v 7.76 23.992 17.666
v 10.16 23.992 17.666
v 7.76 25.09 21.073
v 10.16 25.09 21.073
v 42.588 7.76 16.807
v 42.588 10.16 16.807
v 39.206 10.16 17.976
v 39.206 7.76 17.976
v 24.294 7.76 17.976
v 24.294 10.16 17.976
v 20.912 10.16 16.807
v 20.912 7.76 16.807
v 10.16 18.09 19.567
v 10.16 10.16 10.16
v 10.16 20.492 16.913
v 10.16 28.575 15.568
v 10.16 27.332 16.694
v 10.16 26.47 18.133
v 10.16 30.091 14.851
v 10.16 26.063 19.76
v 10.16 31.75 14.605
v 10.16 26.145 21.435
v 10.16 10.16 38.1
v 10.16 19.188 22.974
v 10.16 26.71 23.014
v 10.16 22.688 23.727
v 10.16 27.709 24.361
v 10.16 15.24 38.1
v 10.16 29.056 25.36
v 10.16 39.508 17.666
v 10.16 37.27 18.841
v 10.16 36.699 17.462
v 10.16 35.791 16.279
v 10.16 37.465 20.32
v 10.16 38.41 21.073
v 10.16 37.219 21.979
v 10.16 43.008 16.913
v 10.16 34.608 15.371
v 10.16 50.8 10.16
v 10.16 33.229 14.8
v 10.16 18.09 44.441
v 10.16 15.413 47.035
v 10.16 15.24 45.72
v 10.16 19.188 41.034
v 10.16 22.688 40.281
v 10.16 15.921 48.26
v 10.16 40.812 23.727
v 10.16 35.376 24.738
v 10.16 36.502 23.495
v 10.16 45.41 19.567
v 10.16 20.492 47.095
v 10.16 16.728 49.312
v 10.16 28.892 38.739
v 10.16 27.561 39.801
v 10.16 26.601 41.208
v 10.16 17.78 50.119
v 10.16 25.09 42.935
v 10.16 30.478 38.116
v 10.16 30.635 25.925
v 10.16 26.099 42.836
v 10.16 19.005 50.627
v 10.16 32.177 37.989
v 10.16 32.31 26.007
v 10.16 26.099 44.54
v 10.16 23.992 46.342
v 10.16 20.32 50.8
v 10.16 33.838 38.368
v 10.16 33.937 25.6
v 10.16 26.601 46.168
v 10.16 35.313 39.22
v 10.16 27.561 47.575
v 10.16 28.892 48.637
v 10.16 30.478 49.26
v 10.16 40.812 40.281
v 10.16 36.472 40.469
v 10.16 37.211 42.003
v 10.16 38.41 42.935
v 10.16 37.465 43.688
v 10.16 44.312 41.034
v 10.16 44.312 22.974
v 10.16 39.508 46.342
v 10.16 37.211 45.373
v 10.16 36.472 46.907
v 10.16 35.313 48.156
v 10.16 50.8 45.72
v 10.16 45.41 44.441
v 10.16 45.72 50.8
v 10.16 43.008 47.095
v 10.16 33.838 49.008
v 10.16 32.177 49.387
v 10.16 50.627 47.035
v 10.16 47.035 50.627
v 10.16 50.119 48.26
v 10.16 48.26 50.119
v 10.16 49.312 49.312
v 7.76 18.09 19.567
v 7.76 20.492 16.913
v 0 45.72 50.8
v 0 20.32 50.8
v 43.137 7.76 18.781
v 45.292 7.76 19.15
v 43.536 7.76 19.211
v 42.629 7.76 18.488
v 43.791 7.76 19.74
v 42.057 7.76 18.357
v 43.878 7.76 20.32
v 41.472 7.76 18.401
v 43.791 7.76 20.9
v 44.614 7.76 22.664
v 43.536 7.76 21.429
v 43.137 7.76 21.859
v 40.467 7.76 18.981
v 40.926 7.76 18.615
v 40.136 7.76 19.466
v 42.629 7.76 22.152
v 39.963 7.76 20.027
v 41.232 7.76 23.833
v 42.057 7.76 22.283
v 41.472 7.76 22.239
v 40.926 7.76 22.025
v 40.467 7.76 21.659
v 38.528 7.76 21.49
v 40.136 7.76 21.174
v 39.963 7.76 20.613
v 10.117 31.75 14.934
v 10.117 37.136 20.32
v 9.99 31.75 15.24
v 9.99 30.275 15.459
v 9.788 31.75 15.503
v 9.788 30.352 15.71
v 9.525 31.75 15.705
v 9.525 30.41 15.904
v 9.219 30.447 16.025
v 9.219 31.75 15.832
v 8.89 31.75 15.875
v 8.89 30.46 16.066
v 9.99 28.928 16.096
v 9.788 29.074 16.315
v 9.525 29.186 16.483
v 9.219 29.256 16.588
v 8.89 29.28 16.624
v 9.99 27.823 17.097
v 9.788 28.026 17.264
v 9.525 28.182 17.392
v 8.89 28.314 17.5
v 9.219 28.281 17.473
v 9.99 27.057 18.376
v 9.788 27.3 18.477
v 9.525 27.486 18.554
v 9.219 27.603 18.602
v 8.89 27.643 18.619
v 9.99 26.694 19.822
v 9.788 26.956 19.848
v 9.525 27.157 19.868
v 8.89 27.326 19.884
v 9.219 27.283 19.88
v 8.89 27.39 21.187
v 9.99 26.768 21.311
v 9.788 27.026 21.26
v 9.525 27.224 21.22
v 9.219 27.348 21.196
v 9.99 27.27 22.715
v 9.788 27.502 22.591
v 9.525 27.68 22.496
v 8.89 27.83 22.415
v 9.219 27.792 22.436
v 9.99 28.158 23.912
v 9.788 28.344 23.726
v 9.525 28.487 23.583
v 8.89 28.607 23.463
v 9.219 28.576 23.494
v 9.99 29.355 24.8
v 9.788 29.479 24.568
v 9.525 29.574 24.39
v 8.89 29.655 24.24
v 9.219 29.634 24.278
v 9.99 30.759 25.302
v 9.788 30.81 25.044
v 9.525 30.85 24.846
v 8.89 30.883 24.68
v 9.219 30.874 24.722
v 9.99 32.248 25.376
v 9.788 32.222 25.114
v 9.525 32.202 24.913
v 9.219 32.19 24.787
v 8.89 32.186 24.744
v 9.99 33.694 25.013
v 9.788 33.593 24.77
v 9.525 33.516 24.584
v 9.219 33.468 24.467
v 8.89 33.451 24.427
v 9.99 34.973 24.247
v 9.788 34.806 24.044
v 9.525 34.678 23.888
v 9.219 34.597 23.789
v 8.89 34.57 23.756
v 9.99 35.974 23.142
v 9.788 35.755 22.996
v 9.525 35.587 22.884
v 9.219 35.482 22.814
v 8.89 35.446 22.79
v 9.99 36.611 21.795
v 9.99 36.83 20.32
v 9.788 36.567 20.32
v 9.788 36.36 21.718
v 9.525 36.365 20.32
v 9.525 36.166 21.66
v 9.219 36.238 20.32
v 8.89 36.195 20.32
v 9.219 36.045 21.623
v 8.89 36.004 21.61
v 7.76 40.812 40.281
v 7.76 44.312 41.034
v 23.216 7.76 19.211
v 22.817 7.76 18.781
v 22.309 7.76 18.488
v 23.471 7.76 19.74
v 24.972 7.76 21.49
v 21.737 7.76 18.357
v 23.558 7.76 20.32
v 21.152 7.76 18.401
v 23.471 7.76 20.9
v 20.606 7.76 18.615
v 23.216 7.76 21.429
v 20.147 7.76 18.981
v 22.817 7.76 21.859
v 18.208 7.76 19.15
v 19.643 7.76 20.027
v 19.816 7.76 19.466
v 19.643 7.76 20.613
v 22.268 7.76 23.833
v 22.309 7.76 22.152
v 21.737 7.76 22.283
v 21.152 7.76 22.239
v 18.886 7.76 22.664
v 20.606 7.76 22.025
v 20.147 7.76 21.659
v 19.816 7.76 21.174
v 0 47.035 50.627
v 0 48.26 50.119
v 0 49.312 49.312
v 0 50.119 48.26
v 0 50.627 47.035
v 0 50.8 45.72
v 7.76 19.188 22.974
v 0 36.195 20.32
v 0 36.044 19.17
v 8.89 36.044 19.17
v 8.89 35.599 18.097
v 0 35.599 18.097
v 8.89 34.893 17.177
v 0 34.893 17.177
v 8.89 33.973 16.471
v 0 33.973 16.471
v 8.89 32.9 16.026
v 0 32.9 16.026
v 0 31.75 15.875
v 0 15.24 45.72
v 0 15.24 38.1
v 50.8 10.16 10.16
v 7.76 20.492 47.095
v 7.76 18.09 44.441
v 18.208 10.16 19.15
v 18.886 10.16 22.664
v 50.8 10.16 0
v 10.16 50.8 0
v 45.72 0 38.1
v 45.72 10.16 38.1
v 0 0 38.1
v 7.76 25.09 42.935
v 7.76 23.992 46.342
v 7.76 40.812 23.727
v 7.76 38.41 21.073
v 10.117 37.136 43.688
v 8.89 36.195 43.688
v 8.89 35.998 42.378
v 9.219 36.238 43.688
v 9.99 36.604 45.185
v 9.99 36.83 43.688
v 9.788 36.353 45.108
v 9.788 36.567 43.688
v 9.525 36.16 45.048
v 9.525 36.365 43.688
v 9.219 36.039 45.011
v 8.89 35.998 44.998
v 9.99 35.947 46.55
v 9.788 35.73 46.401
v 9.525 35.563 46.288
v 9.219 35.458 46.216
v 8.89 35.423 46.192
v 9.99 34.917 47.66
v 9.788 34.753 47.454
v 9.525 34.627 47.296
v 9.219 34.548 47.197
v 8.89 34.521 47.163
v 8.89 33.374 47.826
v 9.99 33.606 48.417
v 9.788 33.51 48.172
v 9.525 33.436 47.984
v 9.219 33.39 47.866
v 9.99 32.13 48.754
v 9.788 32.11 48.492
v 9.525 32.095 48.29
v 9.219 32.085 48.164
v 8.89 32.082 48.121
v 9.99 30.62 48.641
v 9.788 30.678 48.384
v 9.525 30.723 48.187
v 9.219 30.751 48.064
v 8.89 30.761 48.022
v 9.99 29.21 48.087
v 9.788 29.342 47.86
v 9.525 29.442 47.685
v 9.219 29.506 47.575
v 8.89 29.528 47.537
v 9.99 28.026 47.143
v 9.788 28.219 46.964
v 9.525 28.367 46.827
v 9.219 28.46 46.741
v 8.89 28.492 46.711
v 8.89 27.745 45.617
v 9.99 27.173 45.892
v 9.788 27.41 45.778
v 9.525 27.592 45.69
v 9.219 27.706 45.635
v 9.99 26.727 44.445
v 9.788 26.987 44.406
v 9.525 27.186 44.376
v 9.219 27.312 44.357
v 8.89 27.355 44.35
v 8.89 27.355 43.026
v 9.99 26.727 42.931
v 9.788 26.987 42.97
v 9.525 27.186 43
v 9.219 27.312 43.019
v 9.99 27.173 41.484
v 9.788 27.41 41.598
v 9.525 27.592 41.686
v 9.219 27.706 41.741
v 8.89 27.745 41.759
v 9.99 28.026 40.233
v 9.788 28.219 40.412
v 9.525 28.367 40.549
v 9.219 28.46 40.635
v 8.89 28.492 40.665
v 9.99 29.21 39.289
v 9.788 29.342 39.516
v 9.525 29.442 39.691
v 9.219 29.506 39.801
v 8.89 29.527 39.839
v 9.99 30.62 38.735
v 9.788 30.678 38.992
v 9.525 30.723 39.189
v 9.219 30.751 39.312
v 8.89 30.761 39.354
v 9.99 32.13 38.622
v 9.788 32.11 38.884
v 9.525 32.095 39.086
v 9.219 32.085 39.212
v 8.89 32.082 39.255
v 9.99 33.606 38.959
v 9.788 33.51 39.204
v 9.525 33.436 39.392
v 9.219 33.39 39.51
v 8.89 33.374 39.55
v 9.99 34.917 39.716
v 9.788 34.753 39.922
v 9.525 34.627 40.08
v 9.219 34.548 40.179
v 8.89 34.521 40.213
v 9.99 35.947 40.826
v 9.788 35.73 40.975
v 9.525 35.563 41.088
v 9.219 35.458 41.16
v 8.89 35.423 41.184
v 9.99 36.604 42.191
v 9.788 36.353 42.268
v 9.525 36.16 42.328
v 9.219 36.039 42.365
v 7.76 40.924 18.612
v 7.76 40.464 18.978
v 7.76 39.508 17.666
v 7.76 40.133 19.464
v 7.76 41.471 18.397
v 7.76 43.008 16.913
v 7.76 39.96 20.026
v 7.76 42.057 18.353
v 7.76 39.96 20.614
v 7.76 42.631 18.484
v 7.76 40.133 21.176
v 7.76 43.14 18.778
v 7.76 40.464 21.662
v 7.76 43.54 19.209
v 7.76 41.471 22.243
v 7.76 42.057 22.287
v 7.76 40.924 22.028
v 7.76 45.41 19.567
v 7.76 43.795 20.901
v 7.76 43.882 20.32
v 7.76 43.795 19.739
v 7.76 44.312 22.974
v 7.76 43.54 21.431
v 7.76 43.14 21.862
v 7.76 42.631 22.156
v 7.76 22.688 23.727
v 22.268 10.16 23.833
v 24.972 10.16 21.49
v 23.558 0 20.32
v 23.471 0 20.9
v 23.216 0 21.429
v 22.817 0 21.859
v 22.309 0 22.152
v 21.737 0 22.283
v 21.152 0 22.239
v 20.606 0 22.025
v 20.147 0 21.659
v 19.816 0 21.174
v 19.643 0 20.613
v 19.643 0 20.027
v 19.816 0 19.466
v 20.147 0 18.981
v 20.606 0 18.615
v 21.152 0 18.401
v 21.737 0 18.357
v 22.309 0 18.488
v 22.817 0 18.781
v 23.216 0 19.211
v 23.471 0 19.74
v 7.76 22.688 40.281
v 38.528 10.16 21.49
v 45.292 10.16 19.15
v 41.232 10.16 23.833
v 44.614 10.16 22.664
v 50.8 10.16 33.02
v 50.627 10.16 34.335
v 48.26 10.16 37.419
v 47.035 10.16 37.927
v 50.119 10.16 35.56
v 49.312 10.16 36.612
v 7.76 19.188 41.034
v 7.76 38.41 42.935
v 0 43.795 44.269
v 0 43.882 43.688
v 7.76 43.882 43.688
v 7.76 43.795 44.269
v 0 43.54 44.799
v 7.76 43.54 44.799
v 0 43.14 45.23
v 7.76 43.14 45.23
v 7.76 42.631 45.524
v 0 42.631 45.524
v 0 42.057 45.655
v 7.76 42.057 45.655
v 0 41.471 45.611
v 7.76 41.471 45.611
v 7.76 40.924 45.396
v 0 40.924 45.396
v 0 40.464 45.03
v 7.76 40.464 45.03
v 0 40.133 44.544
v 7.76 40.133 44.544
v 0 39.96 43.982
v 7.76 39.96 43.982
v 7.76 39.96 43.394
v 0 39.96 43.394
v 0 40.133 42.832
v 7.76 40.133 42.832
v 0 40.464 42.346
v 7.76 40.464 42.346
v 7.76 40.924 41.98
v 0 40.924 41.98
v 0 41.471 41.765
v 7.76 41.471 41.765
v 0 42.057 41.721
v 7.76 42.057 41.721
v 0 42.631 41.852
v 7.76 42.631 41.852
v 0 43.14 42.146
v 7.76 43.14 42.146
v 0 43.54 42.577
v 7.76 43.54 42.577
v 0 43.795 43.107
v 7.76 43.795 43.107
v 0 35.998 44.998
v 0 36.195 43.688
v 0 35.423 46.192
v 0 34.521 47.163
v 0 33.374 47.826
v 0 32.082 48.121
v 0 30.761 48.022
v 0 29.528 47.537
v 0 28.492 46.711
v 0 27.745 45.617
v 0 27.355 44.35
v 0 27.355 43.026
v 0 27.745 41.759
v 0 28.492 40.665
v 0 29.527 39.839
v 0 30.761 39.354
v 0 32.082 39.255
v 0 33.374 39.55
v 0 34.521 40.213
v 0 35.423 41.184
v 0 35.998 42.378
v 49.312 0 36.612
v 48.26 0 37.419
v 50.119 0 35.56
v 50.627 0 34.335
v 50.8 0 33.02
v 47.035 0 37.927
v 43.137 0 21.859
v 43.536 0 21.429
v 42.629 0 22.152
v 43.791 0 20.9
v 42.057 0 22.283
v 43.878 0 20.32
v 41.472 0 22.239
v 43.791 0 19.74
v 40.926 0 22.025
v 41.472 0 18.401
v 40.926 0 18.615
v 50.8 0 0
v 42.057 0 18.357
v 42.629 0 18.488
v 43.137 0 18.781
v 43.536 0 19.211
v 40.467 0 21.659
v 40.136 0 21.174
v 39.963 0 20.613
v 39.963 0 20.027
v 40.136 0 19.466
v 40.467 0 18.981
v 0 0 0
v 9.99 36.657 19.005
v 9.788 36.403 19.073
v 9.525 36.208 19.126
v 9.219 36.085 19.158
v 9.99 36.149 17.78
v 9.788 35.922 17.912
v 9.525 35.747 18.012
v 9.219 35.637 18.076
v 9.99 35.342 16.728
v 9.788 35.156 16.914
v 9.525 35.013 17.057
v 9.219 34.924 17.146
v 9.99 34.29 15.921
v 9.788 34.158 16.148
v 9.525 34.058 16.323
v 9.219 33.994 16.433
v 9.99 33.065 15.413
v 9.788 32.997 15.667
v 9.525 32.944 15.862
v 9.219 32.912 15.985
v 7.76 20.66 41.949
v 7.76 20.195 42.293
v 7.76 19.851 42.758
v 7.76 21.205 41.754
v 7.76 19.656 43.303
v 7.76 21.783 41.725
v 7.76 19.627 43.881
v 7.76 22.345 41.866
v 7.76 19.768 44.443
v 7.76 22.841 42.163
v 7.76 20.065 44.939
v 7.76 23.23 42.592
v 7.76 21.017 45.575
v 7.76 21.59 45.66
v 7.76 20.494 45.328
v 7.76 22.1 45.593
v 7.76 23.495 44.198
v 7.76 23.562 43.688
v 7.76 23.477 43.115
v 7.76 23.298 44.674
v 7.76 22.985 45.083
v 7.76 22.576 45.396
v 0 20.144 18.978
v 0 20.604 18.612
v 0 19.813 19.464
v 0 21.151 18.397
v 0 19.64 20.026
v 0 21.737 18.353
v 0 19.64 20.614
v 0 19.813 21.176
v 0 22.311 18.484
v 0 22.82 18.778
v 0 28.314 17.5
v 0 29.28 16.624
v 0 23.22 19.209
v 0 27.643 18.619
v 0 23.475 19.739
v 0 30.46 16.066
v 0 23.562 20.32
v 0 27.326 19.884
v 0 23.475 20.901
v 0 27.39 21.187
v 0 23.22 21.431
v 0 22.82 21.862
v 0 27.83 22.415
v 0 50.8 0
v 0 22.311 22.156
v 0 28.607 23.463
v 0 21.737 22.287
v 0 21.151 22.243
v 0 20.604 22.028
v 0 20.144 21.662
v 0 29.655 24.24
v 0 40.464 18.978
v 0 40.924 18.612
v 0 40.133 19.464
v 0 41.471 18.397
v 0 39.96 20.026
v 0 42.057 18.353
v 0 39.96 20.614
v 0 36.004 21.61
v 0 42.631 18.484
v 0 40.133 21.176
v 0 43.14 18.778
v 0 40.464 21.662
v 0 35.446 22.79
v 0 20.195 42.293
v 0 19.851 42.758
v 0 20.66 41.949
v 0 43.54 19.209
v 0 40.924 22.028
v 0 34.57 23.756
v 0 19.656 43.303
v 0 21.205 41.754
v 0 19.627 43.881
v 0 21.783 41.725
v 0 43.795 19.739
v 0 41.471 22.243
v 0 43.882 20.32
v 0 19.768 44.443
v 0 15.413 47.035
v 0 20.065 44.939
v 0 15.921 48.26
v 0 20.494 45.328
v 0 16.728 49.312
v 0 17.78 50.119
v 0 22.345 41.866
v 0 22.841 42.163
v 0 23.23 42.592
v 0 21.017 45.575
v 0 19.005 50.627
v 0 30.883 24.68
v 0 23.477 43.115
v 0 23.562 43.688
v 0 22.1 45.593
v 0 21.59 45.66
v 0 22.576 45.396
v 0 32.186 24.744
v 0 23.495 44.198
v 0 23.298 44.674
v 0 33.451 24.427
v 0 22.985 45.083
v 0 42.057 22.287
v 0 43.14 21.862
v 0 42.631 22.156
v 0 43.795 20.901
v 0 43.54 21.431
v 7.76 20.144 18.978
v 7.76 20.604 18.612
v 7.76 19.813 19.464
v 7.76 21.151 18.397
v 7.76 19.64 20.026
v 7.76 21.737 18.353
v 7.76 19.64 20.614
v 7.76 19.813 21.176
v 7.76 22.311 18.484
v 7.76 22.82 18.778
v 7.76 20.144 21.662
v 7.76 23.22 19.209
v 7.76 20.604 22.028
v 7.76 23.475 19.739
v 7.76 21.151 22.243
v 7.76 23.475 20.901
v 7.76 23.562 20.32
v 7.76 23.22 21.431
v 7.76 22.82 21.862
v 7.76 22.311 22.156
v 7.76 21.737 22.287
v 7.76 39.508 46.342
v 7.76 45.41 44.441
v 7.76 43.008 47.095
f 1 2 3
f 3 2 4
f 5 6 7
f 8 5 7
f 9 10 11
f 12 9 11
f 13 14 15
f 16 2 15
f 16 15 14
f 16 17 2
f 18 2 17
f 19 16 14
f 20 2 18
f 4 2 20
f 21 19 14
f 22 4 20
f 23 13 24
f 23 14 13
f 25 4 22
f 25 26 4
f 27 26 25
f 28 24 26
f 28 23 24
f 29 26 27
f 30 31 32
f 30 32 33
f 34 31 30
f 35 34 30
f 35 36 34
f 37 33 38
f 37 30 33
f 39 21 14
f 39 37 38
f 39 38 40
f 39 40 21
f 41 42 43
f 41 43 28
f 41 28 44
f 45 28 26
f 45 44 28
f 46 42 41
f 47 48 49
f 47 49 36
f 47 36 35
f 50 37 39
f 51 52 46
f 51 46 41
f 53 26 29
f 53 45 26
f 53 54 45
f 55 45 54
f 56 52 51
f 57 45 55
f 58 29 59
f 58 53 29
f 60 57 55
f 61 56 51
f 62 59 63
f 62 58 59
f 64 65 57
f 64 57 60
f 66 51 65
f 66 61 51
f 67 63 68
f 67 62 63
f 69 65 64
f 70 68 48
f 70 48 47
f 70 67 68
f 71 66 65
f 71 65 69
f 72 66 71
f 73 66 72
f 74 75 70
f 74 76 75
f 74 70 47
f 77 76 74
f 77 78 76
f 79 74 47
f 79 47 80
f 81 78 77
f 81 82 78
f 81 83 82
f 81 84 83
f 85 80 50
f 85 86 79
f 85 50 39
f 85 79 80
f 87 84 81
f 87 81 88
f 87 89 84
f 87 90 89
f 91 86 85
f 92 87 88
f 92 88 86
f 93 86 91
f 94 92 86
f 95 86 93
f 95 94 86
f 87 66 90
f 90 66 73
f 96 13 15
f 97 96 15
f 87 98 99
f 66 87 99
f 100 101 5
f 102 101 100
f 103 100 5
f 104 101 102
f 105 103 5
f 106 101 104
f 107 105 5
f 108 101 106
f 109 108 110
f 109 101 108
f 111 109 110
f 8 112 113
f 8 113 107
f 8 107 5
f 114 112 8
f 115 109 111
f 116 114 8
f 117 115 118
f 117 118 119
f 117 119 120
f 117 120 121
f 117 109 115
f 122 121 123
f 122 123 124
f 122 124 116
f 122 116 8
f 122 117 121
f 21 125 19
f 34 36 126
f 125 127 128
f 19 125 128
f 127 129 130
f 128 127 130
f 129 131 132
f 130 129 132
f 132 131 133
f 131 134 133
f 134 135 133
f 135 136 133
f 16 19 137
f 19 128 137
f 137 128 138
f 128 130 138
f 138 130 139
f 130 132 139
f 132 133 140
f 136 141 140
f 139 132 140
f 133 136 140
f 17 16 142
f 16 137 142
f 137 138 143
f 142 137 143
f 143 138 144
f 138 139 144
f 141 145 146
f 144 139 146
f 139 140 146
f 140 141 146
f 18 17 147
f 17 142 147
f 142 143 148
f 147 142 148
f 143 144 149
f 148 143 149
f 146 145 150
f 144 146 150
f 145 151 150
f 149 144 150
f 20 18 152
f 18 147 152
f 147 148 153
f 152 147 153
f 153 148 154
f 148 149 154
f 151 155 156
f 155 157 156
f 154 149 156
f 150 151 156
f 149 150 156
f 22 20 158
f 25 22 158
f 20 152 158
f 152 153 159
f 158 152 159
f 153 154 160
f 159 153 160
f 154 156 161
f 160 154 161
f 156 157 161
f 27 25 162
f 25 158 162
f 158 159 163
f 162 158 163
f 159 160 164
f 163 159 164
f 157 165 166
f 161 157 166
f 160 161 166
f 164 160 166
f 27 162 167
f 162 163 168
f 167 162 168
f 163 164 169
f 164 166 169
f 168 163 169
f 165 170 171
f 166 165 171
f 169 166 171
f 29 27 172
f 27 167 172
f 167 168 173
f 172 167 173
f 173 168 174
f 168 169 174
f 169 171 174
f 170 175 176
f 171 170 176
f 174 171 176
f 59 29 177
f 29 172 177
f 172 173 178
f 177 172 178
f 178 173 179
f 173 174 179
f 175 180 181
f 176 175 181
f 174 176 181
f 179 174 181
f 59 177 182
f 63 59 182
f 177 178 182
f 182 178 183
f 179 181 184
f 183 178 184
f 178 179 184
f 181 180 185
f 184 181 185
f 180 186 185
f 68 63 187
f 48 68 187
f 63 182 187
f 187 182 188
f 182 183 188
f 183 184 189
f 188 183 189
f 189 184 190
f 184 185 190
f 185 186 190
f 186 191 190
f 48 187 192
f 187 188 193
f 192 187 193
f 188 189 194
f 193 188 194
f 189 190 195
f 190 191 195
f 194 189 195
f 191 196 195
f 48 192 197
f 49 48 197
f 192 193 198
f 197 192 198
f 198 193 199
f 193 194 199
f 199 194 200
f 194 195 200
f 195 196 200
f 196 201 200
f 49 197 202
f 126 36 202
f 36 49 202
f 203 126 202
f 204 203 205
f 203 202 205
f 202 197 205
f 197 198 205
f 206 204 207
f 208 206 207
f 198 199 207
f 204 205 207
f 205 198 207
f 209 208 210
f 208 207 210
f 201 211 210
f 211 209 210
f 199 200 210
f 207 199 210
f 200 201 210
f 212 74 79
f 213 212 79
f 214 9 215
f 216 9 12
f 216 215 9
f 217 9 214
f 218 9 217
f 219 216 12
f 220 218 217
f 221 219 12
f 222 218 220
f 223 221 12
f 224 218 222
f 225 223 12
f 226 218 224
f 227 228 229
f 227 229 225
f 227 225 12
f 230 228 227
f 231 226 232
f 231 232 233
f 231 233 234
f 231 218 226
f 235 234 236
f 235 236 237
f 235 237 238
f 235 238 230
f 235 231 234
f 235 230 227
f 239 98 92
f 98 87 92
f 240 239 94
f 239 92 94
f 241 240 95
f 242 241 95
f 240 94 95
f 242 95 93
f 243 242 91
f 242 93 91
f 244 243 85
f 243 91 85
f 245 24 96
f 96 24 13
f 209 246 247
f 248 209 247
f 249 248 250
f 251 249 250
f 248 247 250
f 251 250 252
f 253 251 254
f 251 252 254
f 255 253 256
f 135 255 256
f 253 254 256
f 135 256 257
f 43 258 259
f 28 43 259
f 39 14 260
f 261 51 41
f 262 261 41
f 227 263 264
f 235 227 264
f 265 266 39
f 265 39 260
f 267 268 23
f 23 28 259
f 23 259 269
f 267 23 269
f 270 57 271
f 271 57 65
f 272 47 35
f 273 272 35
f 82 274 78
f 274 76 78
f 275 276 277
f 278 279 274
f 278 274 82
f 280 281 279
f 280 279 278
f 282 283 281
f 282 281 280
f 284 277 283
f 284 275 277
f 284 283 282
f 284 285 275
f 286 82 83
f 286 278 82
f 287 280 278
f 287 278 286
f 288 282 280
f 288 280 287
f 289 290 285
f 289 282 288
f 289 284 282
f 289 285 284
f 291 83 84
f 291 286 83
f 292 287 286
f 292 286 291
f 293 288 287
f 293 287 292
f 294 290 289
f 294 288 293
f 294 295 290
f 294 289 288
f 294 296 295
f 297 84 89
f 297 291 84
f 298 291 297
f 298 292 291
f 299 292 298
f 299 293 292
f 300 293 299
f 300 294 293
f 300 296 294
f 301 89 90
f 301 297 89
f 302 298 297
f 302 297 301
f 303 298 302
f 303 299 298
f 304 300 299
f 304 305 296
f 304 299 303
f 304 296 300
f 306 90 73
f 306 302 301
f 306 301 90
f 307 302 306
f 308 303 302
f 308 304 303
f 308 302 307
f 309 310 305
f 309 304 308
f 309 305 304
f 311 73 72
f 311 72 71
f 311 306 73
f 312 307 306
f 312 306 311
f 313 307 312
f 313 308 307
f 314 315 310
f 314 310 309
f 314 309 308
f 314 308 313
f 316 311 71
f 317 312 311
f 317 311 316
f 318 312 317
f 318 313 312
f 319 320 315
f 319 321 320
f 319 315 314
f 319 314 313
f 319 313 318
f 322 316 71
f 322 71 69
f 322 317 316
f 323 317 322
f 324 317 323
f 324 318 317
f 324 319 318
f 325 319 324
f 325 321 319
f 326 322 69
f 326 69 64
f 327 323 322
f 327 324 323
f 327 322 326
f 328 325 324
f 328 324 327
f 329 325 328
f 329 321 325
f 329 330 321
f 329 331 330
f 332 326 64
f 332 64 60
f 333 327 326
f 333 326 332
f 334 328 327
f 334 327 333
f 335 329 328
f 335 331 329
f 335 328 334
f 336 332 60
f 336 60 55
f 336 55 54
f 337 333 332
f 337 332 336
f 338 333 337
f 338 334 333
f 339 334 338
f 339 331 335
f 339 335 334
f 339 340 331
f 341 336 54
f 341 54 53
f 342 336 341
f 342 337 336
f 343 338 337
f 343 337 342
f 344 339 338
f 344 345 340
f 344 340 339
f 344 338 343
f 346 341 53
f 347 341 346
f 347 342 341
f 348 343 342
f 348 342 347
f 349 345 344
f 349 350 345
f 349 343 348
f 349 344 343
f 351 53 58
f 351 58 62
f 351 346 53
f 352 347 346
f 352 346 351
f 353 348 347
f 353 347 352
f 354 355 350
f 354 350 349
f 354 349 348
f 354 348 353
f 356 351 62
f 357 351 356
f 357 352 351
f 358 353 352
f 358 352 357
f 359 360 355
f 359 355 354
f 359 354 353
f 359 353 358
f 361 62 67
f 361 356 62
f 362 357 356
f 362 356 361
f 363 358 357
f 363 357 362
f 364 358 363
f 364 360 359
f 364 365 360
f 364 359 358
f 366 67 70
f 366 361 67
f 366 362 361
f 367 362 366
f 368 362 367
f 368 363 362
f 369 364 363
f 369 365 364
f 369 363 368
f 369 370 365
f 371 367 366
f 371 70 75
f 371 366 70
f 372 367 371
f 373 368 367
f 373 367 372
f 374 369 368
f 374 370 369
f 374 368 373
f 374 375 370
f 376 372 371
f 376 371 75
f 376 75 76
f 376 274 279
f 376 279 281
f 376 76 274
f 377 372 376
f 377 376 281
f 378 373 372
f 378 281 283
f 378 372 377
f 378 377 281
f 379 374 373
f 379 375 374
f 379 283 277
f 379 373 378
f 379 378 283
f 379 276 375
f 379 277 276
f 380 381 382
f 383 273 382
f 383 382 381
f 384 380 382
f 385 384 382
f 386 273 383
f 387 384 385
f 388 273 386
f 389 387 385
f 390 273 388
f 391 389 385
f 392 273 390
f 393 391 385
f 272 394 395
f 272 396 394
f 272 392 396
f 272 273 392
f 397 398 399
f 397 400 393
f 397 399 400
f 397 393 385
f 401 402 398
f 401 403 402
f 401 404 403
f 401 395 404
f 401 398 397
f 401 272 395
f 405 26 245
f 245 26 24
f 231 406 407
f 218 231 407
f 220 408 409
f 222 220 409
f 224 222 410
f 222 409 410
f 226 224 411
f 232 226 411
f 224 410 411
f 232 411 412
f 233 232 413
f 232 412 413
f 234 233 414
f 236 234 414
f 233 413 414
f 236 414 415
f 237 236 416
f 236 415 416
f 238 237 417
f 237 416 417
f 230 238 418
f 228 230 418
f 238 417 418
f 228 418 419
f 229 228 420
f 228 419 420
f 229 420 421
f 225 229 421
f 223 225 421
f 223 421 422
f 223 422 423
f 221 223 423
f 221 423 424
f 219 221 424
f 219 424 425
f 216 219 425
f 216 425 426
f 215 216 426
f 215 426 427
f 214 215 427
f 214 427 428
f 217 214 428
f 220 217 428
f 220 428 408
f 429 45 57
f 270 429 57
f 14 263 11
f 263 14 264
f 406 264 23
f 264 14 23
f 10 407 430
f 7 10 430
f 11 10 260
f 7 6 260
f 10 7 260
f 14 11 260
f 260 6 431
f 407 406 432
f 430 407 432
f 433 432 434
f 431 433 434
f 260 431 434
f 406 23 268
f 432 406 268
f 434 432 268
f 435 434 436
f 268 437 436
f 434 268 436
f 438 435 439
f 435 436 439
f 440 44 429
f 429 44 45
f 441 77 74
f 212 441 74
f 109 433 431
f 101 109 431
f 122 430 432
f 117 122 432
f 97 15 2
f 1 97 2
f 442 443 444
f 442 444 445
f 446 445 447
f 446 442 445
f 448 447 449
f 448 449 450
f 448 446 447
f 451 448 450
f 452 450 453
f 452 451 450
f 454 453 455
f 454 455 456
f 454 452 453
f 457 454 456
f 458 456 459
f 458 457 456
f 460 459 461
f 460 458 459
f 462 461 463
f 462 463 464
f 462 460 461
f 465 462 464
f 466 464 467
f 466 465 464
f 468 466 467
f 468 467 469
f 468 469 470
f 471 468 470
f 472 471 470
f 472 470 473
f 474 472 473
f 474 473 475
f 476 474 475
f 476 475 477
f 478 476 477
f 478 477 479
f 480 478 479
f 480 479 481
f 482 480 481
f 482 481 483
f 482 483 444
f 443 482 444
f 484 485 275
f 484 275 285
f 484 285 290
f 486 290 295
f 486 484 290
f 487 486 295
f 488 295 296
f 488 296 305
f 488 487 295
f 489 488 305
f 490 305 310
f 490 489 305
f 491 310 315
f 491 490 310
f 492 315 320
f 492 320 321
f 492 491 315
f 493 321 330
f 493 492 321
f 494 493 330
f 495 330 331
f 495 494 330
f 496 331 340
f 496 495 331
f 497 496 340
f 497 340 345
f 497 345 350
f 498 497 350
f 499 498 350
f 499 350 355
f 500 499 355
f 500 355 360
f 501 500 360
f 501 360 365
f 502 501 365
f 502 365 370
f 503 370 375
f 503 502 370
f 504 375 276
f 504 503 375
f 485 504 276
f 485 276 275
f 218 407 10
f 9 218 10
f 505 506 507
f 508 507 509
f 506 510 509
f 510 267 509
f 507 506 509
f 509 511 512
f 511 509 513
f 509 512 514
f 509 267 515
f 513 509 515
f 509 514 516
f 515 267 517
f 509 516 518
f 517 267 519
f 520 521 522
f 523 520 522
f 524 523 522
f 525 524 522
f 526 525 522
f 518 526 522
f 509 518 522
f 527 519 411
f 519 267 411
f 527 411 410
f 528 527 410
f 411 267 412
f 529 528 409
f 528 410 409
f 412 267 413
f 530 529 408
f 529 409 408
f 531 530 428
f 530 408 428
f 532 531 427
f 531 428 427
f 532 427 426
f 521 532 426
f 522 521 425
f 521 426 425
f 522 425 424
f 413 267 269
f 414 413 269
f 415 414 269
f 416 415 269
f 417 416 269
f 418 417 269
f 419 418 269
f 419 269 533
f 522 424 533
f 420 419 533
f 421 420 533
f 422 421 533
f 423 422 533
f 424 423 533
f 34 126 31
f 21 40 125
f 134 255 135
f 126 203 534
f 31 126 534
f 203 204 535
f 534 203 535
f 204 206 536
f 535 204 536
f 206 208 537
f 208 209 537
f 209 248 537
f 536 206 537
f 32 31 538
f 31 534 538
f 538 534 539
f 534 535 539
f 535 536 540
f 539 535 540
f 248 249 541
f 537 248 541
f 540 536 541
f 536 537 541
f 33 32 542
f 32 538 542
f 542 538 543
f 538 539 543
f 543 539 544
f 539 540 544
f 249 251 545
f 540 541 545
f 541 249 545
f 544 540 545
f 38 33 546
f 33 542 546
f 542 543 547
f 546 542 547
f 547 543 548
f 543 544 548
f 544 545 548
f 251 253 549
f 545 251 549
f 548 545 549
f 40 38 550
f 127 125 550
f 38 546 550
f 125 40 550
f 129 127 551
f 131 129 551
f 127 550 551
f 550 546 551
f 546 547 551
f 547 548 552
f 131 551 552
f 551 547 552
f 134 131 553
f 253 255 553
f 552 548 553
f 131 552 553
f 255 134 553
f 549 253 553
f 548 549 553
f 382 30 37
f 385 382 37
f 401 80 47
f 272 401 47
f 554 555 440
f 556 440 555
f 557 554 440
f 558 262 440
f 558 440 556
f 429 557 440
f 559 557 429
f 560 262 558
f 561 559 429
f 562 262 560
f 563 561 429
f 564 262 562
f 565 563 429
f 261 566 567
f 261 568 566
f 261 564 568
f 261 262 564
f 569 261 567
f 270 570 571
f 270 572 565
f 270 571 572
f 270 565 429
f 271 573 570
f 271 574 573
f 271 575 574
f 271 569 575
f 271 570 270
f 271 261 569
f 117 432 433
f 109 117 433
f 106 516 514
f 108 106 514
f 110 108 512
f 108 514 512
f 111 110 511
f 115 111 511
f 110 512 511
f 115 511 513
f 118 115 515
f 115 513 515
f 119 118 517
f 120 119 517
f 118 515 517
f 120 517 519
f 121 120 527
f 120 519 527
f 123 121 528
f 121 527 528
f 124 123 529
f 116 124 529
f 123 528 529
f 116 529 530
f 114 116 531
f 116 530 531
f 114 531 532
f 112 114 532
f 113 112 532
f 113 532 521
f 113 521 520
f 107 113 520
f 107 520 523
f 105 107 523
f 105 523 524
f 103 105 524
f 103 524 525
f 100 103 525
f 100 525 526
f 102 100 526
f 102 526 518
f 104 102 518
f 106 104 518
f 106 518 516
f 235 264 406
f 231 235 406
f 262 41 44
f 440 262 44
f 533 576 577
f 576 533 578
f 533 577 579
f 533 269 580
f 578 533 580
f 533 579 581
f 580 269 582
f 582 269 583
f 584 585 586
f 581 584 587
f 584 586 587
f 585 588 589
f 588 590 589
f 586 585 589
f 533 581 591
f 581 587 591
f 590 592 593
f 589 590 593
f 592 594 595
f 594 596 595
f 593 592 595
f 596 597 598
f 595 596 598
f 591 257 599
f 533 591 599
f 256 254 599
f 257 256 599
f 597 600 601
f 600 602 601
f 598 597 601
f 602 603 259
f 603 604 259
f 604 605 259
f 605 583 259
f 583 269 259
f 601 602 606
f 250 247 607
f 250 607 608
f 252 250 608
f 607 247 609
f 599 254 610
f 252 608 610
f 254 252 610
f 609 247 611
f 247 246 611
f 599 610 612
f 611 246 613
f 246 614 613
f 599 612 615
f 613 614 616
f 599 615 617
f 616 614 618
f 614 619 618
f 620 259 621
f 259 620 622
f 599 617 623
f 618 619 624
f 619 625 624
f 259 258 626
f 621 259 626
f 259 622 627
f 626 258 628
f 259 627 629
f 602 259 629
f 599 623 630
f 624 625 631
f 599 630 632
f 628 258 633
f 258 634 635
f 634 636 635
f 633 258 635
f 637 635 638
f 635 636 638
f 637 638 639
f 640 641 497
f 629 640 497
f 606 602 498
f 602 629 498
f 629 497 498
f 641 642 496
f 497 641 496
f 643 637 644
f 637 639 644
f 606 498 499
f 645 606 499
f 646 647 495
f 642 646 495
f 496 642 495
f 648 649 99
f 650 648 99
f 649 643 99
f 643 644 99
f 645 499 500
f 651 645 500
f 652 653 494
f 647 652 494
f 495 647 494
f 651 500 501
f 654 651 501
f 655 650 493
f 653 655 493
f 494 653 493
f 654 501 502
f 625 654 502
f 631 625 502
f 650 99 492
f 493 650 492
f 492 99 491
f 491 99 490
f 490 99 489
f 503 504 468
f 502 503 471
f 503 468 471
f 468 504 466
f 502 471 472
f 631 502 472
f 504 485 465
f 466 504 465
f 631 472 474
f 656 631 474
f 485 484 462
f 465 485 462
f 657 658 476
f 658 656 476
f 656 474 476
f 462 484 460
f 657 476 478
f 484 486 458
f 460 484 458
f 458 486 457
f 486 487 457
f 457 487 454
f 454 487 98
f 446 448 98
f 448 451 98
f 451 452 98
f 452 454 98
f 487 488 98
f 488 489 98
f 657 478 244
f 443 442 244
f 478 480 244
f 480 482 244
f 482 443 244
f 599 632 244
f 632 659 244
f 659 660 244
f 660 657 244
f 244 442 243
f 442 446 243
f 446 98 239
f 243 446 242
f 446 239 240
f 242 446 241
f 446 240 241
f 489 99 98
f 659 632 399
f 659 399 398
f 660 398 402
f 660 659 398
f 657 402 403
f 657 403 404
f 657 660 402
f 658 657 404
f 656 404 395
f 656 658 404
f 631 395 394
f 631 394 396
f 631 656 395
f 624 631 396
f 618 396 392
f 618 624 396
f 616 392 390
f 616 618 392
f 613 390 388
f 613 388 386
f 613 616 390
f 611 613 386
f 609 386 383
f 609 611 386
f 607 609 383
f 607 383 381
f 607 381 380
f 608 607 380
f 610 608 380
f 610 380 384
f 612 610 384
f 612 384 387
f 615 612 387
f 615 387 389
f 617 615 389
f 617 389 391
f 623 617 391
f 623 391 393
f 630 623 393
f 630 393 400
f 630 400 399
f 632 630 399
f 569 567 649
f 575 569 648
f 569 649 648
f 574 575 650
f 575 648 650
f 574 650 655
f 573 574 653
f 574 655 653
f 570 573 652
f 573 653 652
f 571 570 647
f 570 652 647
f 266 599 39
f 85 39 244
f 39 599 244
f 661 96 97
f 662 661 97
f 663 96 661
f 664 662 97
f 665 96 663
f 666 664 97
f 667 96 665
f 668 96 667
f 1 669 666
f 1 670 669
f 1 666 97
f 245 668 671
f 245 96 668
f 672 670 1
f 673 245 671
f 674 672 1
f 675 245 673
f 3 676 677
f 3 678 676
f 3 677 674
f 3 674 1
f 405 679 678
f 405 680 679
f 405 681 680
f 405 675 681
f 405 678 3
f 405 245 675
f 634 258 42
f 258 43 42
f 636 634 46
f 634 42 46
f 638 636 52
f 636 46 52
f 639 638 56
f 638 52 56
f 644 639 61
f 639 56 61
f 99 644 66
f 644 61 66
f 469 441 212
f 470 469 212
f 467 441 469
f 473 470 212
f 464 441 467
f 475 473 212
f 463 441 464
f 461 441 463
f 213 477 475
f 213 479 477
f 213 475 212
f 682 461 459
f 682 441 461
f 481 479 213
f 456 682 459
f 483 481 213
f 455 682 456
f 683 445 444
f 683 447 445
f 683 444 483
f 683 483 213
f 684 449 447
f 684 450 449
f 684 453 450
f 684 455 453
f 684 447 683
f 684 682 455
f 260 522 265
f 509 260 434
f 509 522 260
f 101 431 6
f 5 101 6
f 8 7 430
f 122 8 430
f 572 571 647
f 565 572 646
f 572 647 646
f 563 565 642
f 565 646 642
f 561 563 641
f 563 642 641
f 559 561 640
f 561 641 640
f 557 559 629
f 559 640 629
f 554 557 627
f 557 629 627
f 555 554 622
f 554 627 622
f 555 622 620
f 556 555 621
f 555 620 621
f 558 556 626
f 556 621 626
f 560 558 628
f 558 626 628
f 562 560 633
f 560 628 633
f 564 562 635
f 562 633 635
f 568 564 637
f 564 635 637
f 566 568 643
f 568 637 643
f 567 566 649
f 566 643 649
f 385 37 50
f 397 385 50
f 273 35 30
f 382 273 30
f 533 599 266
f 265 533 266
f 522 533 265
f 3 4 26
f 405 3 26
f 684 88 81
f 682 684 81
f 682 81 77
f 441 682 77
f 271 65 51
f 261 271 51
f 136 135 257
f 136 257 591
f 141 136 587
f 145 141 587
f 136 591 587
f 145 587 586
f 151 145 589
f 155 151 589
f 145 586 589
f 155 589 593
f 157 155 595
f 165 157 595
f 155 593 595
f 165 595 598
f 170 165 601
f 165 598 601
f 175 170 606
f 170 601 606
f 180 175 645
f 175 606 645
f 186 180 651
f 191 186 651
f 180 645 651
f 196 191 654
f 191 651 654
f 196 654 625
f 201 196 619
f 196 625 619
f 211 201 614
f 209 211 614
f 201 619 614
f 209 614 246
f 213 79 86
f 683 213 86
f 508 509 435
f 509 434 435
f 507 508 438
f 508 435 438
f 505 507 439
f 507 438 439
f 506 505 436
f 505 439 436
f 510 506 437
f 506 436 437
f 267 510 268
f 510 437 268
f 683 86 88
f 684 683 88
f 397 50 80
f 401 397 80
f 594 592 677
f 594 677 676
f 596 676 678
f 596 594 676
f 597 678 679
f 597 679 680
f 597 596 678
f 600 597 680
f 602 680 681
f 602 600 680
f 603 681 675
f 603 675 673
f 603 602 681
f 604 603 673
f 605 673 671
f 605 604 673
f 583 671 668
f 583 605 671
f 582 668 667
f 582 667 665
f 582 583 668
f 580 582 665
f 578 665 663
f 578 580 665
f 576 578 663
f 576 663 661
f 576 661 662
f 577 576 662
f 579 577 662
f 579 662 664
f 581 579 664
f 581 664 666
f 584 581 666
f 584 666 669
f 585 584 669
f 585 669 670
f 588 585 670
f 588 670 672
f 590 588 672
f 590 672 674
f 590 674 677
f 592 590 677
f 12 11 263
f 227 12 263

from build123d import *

# Parameters (mm, degrees)
F0_R      = 1.9722998741
F0_R_2    = 4.445
F1_DEPTH  = 10.16
F2_R      = 1.9722998741
F3_DEPTH  = 2.4
F4_R      = 5.08
F5_W      = 50.8
F5_H      = 38.1
F5_R      = 1.9685
F6_DEPTH  = 10.16
F7_R      = 5.08
F8_R      = 1.9685
F9_DEPTH  = 2.4
F11_DEPTH = 10.16
F12_R     = 1.27


# Not quite as in the source:
# - a feature names something its author has since deleted; it is built from what else it names


with BuildPart() as f1:
    # F0 (on Right) → F1 (new body)
    with BuildSketch(Plane.YZ):
        Polygon((15.24, 38.1), (0, 38.1), (0, 0), (31.75, 0), (50.8, 0), (50.8, 50.8), (31.75, 50.8), (21.59, 50.8), (15.24, 50.8), align=None)
        with Locations((21.59, 20.32)):
            Circle(F0_R, mode=Mode.SUBTRACT)
        with BuildLine():
            ThreePointArc((36.195, 20.32), (34.8930896424, 17.1769103576), (31.75, 15.875))
            ThreePointArc((31.75, 15.875), (28.6069103576, 23.4630896424), (36.195, 20.32))
        make_face(mode=Mode.SUBTRACT)
        with Locations((41.91, 20.32)):
            Circle(F0_R, mode=Mode.SUBTRACT)
        with BuildLine():
            ThreePointArc((23.5622998741, 43.688), (20.1953733845, 42.2933733845), (21.59, 45.6602998741))
            ThreePointArc((21.59, 45.6602998741), (22.9846266155, 45.0826266155), (23.5622998741, 43.688))
        make_face(mode=Mode.SUBTRACT)
        with Locations((31.75, 43.688)):
            Circle(F0_R_2, mode=Mode.SUBTRACT)
        with Locations((41.91, 43.688)):
            Circle(F0_R, mode=Mode.SUBTRACT)
    extrude(amount=F1_DEPTH)

    # F2 (on face) → F3 (cut)
    with BuildSketch(Plane.YZ.offset(10.16)):
        Polygon((20.4920916615, 47.0950413284), (18.0904614886, 44.440704152), (19.1883698271, 41.0336628236), (22.6879083385, 40.2809586716), (25.0895385114, 42.935295848), (23.9916301729, 46.3423371764), align=None)
        with Locations((21.59, 43.688)):
            Circle(F2_R, mode=Mode.SUBTRACT)
        Polygon((40.8120916615, 40.2809586716), (44.3116301729, 41.0336628236), (45.4095385114, 44.440704152), (43.0079083385, 47.0950413284), (39.5083698271, 46.3423371764), (38.4104614886, 42.935295848), align=None)
        with Locations((41.91, 43.688)):
            Circle(F2_R, mode=Mode.SUBTRACT)
        Polygon((44.3116301729, 22.9743371764), (40.8120916615, 23.7270413284), (38.4104614886, 21.072704152), (39.5083698271, 17.6656628236), (43.0079083385, 16.9129586716), (45.4095385114, 19.567295848), align=None)
        with Locations((41.91, 20.32)):
            Circle(F2_R, mode=Mode.SUBTRACT)
        Polygon((22.6879083385, 23.7270413284), (19.1883698271, 22.9743371764), (18.0904614886, 19.567295848), (20.4920916615, 16.9129586716), (23.9916301729, 17.6656628236), (25.0895385114, 21.072704152), align=None)
        with Locations((21.59, 20.32)):
            Circle(F2_R, mode=Mode.SUBTRACT)
    extrude(amount=-F3_DEPTH, mode=Mode.SUBTRACT)

    # F4
    f4_edges = [f1.edges().sort_by_distance(p)[0] for p in [
        (5.08, 50.8, 50.8),
        (5.08, 15.24, 50.8),
    ]]
    fillet(f4_edges, radius=F4_R)

    # F5 (on Front) → F6 (join)
    with BuildSketch(Plane.XZ):
        with Locations((25.4, 19.05)):
            Rectangle(F5_W, F5_H)
        with Locations((21.59, 20.32)):
            Circle(F5_R, mode=Mode.SUBTRACT)
        with Locations((41.91, 20.32)):
            Circle(F5_R, mode=Mode.SUBTRACT)
    extrude(amount=-F6_DEPTH)

    # F7
    f7_edges = [f1.edges().sort_by_distance(p)[0] for p in [
        (50.8, 5.08, 38.1),
    ]]
    fillet(f7_edges, radius=F7_R)

    # F8 (on face) → F9 (cut)
    with BuildSketch(Plane(origin=(0, 10.16, 0), x_dir=(-1, 0, 0), z_dir=(0, 1, 0))):
        Polygon((-41.2323596559, 23.8334340491), (-44.613902969, 22.6635707772), (-45.2915433131, 19.1501367281), (-42.5876403441, 16.8065659509), (-39.206097031, 17.9764292228), (-38.5284566869, 21.4898632719), align=None)
        with Locations((-41.91, 20.32)):
            Circle(F8_R, mode=Mode.SUBTRACT)
        Polygon((-24.293902969, 17.9764292228), (-20.9123596559, 16.8065659509), (-18.2084566869, 19.1501367281), (-18.886097031, 22.6635707772), (-22.2676403441, 23.8334340491), (-24.9715433131, 21.4898632719), align=None)
        with Locations((-21.59, 20.32)):
            Circle(F8_R, mode=Mode.SUBTRACT)
    extrude(amount=-F9_DEPTH, mode=Mode.SUBTRACT)

    # F10 (on face) → F11 (join)
    with BuildSketch(Plane(origin=(0, 0, 0), x_dir=(1, 0, 0), z_dir=(0, 0, -1))):
        Polygon((10.16, -10.16), (10.16, -50.8), (50.8, -10.16), align=None)
    extrude(amount=-F11_DEPTH)

    # F12
    f12_edges = [f1.edges().sort_by_distance(p)[0] for p in [
        (10.16, 27.305, 20.32),
        (10.16, 27.305, 43.688),
    ]]
    fillet(f12_edges, radius=F12_R)


solid = f1.part
